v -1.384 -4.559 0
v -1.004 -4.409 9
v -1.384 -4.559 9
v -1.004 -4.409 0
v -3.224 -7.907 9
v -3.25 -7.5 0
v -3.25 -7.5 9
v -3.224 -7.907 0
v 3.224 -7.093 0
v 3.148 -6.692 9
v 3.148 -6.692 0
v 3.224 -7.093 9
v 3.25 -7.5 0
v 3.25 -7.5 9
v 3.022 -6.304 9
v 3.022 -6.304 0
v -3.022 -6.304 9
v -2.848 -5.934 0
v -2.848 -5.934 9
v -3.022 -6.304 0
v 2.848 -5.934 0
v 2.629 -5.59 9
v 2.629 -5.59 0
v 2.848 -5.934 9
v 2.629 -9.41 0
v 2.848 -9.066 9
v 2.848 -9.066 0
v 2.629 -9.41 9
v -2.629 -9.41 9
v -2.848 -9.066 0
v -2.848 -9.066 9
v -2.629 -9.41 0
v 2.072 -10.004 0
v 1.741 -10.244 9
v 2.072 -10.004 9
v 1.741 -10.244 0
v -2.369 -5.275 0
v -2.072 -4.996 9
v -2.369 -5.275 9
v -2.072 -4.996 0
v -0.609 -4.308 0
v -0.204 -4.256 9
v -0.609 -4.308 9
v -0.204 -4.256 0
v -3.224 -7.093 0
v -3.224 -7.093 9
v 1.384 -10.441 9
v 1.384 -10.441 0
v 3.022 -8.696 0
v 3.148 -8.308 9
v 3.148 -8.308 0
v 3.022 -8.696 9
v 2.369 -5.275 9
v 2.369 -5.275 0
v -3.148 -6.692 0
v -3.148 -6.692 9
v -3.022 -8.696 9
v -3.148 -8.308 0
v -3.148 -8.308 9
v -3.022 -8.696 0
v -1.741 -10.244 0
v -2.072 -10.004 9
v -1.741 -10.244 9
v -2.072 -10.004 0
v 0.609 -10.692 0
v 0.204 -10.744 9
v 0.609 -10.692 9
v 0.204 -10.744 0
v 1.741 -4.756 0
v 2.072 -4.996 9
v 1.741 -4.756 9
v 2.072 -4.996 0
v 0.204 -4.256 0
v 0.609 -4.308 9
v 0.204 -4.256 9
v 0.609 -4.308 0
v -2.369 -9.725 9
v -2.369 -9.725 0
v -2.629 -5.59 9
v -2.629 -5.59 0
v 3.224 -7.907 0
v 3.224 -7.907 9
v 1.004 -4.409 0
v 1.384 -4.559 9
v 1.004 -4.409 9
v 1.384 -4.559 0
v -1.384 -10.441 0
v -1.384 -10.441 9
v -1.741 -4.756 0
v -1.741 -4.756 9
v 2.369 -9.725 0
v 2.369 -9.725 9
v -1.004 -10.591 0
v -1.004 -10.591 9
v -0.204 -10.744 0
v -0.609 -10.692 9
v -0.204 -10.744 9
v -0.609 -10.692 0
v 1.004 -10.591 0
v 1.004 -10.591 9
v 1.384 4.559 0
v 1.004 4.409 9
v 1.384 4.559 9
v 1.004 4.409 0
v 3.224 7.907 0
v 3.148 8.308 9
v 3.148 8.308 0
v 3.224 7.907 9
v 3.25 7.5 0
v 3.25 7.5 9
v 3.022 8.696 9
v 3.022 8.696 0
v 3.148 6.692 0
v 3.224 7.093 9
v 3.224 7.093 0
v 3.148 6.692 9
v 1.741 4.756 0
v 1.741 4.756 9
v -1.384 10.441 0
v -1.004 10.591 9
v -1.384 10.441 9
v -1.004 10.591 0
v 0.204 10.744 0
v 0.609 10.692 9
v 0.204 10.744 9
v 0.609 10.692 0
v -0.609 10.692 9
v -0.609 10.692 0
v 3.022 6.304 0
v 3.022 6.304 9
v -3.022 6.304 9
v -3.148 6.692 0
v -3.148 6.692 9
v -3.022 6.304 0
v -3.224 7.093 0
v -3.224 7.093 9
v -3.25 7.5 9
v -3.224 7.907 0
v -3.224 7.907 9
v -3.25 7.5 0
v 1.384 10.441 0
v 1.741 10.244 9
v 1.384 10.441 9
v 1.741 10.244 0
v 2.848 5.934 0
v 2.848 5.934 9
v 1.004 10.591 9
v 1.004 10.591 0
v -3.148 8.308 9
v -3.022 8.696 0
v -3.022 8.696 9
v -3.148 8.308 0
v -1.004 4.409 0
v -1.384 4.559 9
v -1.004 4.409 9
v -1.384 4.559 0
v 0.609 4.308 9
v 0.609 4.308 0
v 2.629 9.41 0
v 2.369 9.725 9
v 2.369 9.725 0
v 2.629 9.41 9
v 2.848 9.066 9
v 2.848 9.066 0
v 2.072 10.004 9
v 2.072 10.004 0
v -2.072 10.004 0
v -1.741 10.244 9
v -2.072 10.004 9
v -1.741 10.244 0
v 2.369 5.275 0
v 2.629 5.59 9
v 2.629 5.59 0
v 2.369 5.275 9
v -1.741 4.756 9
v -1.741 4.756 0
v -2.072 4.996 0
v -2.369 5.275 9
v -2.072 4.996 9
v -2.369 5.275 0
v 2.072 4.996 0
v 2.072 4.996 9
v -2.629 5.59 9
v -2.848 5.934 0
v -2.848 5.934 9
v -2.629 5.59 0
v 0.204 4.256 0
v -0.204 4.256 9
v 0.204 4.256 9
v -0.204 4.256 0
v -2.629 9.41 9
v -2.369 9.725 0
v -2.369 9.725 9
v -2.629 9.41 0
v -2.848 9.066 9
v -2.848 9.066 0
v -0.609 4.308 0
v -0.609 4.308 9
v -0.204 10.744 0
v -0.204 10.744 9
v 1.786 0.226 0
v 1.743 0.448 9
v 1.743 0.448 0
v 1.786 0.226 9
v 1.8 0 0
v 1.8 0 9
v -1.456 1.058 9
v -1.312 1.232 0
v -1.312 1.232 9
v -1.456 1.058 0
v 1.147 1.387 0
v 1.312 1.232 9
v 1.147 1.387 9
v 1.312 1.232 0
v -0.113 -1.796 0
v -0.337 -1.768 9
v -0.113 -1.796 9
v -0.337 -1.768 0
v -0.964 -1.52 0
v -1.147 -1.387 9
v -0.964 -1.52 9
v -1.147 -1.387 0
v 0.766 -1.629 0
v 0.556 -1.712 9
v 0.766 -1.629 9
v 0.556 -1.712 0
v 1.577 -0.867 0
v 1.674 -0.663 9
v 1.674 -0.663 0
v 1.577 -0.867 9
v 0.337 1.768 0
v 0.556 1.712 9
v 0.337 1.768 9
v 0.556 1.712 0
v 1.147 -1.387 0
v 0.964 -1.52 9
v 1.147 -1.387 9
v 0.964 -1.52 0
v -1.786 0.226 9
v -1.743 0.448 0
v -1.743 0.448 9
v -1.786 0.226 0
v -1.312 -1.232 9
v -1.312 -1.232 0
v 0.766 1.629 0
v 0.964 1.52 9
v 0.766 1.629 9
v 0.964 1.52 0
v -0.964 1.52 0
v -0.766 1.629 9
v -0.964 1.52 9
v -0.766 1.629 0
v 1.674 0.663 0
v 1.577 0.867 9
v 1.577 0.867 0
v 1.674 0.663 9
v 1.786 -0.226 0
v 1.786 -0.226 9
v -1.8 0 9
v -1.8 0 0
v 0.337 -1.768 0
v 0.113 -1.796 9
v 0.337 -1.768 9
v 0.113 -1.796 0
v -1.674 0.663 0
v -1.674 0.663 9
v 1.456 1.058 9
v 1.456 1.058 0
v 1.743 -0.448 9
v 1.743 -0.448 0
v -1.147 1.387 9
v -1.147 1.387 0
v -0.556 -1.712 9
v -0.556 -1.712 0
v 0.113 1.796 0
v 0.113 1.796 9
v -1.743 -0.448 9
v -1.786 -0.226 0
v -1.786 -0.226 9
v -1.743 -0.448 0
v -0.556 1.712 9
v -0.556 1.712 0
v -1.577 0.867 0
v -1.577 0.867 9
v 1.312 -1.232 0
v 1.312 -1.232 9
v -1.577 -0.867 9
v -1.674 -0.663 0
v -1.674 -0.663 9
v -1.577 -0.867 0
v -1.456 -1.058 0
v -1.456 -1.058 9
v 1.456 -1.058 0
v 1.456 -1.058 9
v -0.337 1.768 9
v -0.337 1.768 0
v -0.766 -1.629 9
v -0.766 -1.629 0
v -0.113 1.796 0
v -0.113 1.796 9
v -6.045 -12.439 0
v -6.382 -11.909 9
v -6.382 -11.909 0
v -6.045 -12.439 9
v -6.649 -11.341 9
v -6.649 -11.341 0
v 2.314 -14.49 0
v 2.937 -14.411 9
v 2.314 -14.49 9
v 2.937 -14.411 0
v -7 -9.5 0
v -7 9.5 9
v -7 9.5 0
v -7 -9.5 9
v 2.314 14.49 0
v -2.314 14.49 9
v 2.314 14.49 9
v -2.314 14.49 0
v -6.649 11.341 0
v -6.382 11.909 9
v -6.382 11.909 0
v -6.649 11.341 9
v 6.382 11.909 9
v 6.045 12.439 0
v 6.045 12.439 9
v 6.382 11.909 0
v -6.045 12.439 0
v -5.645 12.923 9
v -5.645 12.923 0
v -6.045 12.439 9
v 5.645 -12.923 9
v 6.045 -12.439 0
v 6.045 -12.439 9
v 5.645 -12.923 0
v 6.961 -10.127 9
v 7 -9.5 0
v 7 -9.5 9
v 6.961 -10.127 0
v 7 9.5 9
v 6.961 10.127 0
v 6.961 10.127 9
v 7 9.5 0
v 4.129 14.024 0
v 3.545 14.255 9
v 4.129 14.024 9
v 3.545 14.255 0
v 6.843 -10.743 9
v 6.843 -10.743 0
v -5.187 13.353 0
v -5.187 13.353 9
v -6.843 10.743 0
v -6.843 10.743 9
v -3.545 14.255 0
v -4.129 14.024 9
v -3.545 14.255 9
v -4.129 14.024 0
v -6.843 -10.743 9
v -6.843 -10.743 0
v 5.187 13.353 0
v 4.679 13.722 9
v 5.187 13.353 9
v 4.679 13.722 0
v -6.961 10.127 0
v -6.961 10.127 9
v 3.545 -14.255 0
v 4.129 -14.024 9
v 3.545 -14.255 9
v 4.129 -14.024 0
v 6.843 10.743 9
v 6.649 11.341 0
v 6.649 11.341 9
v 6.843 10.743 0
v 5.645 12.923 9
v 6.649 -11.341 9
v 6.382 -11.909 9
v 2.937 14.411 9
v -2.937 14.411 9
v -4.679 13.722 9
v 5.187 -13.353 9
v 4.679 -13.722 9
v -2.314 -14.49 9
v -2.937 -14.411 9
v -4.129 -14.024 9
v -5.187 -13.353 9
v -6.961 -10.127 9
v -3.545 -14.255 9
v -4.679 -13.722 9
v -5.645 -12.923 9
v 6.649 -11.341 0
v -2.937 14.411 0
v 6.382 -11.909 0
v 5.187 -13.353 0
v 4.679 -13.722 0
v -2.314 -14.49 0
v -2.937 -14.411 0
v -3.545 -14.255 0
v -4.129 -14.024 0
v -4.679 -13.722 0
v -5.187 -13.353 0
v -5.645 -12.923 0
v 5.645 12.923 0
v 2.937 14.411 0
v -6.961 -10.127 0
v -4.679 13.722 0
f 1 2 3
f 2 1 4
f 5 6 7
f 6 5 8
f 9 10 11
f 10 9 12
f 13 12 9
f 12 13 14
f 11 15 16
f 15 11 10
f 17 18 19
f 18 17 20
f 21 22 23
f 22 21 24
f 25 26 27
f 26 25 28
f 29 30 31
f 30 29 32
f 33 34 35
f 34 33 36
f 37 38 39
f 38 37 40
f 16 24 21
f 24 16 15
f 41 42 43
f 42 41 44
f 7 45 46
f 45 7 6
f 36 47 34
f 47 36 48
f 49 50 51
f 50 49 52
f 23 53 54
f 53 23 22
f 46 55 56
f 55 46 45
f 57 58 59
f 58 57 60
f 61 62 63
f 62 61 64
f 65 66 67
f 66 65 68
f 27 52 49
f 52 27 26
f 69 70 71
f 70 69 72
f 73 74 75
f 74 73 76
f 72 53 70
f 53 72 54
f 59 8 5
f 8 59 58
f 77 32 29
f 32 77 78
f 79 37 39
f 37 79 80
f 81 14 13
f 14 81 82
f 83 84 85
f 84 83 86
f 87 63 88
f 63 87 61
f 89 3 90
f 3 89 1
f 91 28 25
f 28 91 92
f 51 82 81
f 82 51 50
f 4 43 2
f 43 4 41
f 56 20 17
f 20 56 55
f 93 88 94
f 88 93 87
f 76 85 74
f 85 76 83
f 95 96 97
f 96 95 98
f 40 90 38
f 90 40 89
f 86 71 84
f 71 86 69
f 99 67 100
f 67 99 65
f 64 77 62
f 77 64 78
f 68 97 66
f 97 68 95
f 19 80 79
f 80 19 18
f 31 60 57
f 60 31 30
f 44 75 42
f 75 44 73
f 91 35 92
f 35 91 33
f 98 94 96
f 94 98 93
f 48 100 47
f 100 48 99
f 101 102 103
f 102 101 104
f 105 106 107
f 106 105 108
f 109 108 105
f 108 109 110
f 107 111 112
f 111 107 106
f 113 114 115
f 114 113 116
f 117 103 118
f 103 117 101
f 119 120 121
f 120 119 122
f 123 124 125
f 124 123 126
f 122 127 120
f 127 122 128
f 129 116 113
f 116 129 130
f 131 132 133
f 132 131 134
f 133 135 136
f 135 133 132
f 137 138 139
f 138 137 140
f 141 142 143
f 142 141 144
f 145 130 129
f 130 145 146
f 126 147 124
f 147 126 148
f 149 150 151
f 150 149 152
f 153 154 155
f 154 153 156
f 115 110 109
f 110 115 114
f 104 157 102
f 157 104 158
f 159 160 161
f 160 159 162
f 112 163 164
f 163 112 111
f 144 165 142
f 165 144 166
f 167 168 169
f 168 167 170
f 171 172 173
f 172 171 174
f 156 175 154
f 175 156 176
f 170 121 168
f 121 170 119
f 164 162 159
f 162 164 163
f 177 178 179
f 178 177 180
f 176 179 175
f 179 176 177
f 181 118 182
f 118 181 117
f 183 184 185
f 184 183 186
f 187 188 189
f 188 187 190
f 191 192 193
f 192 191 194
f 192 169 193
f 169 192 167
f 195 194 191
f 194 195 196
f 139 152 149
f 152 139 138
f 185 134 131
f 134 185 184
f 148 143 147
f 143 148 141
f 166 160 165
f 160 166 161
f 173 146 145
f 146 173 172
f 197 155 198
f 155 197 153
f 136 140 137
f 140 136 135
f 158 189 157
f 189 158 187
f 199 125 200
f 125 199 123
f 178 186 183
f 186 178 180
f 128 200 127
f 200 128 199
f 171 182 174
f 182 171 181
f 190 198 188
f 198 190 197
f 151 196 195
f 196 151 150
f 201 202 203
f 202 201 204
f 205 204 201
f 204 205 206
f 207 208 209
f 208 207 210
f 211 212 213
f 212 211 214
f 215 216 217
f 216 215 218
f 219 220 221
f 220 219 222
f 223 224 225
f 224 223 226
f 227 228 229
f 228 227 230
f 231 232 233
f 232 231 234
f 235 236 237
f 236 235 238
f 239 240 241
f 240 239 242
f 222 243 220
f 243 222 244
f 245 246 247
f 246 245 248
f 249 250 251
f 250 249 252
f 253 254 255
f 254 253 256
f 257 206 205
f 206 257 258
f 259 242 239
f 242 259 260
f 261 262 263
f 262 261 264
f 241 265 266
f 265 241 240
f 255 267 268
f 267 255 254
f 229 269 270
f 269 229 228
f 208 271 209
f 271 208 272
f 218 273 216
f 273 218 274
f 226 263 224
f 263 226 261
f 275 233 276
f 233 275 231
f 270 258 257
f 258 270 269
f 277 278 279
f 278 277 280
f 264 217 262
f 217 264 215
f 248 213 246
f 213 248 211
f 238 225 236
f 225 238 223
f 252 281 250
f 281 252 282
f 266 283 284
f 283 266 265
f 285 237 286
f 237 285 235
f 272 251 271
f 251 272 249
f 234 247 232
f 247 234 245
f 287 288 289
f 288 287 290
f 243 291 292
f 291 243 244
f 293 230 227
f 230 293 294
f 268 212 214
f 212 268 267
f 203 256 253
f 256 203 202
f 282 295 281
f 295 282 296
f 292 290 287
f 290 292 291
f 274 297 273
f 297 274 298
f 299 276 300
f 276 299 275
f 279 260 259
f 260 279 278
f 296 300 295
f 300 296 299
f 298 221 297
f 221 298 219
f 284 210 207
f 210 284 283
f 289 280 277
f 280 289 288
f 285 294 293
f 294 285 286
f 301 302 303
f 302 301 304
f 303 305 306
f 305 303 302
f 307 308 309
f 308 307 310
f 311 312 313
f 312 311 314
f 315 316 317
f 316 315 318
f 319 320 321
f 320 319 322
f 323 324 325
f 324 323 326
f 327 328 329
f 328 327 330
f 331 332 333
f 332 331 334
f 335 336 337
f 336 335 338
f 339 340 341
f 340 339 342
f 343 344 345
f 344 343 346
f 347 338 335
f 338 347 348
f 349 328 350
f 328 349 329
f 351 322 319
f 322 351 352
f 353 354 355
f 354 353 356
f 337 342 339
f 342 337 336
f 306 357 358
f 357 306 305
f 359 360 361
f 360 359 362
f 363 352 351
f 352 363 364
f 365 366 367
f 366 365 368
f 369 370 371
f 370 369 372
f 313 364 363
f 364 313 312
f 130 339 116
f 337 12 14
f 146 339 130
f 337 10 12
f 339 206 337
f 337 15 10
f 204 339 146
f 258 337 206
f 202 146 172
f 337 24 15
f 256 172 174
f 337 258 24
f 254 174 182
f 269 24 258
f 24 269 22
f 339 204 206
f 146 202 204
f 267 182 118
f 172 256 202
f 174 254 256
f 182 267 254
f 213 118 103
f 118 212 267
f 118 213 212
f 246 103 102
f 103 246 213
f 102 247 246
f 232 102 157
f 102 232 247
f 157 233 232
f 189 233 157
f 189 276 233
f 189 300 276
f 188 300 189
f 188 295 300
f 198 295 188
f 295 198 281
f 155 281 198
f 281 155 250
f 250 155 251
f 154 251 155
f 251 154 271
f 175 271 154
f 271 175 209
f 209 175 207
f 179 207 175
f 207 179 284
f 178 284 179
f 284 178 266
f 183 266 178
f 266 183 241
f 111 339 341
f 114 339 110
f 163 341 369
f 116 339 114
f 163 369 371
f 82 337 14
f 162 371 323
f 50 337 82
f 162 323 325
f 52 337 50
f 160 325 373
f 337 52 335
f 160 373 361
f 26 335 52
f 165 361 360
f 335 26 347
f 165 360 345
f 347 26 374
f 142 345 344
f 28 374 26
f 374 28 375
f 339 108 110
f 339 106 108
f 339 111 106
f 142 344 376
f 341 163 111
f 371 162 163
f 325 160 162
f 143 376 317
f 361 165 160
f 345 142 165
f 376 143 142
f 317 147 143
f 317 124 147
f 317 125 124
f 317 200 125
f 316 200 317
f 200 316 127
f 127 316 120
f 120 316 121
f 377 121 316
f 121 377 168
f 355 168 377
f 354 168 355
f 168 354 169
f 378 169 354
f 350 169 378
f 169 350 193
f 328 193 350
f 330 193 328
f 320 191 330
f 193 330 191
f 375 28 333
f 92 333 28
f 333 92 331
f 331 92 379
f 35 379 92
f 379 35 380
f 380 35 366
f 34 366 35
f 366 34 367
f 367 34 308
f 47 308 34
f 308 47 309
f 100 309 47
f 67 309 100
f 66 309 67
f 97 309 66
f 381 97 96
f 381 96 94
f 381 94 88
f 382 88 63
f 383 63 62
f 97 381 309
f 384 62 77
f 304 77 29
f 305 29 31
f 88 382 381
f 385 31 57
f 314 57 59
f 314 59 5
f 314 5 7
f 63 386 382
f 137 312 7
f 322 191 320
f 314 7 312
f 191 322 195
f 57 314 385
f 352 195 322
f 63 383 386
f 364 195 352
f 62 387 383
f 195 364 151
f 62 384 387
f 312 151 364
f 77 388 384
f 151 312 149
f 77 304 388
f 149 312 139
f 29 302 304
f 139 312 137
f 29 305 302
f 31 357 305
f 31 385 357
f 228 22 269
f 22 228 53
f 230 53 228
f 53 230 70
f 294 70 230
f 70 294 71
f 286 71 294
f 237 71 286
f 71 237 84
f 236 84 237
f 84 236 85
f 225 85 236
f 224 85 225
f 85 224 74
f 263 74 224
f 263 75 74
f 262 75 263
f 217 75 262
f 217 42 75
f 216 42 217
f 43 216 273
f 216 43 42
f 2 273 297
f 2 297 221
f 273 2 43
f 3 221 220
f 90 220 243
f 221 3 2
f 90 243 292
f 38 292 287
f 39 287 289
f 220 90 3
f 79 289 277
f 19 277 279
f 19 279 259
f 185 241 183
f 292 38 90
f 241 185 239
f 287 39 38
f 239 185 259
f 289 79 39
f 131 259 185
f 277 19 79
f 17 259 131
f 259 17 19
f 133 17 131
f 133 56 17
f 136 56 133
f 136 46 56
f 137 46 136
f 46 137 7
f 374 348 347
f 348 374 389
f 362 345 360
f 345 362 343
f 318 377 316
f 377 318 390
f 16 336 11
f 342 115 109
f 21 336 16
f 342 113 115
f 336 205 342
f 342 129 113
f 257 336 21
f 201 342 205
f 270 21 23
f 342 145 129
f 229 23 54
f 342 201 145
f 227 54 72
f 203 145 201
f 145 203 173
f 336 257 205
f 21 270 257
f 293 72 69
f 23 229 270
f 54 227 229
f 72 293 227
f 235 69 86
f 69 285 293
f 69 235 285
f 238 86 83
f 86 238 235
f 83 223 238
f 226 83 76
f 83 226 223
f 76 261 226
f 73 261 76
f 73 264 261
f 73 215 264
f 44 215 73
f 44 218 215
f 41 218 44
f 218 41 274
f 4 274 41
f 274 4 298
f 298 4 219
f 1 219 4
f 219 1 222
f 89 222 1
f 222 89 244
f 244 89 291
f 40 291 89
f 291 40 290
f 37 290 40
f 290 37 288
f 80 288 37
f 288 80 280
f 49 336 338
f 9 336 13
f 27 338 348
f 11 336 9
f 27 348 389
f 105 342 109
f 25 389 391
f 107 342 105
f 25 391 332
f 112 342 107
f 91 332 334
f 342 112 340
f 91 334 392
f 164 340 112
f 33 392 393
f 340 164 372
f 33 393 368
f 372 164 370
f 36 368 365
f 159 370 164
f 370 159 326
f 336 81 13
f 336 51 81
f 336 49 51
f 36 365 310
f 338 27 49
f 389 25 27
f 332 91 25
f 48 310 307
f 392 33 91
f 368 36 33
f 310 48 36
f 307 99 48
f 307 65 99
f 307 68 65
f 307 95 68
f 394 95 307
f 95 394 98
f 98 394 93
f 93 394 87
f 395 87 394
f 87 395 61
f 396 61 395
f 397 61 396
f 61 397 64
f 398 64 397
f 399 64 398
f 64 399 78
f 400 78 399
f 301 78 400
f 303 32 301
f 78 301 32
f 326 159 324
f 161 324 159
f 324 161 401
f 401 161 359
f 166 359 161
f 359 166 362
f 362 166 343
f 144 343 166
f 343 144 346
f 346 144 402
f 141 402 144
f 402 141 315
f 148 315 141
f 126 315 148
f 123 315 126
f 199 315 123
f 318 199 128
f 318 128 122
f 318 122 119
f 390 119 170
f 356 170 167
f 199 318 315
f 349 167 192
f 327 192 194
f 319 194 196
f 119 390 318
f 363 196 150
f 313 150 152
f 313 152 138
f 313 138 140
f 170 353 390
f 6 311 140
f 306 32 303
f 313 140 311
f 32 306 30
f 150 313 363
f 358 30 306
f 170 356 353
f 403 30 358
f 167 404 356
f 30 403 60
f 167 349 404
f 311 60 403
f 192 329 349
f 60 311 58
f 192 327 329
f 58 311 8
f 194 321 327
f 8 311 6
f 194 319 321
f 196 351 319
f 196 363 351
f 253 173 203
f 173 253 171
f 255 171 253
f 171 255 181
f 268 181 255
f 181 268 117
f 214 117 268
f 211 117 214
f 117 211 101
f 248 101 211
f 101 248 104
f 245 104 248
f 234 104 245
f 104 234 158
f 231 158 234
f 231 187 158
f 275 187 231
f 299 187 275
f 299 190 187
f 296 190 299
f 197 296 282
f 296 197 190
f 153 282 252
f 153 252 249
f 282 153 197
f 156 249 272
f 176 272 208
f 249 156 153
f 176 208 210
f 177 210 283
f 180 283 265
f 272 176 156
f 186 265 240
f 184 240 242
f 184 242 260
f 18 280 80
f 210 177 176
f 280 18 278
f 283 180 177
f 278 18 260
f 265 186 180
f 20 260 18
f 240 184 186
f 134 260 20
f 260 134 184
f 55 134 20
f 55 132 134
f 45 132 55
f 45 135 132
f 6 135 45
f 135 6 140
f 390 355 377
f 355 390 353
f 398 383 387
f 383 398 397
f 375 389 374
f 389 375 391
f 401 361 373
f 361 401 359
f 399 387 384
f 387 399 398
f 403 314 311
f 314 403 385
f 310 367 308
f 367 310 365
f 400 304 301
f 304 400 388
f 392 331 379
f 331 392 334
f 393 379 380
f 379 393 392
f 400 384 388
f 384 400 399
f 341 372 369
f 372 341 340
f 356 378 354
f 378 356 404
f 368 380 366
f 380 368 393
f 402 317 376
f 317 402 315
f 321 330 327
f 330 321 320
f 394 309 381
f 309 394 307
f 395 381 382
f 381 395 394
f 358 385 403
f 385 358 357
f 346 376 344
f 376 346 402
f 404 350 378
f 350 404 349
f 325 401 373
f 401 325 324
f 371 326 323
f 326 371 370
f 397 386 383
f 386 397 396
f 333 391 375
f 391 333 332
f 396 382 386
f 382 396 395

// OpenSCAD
$fn = 50;

difference() {
	union() {
		hull() {
			translate(v = [-2.0, 9.5, 0]) {
				cylinder(h = 9, r = 5);
			}
			translate(v = [2.0, 9.5, 0]) {
				cylinder(h = 9, r = 5);
			}
			translate(v = [-2.0, -9.5, 0]) {
				cylinder(h = 9, r = 5);
			}
			translate(v = [2.0, -9.5, 0]) {
				cylinder(h = 9, r = 5);
			}
		}
	}
	union() {
		translate(v = [0.0, -7.5, 0]) {
			translate(v = [0, 0, -100]) {
				cylinder(h = 200, r = 3.25);
			}
		}
		translate(v = [0.0, 7.5, 0]) {
			translate(v = [0, 0, -100]) {
				cylinder(h = 200, r = 3.25);
			}
		}
		translate(v = [0.0, -7.5, 0]) {
			translate(v = [0, 0, -100]) {
				cylinder(h = 200, r = 1.8);
			}
		}
		translate(v = [0, 0, -100]) {
			cylinder(h = 200, r = 1.8);
		}
		translate(v = [0.0, 7.5, 0]) {
			translate(v = [0, 0, -100]) {
				cylinder(h = 200, r = 1.8);
			}
		}
	}
}
